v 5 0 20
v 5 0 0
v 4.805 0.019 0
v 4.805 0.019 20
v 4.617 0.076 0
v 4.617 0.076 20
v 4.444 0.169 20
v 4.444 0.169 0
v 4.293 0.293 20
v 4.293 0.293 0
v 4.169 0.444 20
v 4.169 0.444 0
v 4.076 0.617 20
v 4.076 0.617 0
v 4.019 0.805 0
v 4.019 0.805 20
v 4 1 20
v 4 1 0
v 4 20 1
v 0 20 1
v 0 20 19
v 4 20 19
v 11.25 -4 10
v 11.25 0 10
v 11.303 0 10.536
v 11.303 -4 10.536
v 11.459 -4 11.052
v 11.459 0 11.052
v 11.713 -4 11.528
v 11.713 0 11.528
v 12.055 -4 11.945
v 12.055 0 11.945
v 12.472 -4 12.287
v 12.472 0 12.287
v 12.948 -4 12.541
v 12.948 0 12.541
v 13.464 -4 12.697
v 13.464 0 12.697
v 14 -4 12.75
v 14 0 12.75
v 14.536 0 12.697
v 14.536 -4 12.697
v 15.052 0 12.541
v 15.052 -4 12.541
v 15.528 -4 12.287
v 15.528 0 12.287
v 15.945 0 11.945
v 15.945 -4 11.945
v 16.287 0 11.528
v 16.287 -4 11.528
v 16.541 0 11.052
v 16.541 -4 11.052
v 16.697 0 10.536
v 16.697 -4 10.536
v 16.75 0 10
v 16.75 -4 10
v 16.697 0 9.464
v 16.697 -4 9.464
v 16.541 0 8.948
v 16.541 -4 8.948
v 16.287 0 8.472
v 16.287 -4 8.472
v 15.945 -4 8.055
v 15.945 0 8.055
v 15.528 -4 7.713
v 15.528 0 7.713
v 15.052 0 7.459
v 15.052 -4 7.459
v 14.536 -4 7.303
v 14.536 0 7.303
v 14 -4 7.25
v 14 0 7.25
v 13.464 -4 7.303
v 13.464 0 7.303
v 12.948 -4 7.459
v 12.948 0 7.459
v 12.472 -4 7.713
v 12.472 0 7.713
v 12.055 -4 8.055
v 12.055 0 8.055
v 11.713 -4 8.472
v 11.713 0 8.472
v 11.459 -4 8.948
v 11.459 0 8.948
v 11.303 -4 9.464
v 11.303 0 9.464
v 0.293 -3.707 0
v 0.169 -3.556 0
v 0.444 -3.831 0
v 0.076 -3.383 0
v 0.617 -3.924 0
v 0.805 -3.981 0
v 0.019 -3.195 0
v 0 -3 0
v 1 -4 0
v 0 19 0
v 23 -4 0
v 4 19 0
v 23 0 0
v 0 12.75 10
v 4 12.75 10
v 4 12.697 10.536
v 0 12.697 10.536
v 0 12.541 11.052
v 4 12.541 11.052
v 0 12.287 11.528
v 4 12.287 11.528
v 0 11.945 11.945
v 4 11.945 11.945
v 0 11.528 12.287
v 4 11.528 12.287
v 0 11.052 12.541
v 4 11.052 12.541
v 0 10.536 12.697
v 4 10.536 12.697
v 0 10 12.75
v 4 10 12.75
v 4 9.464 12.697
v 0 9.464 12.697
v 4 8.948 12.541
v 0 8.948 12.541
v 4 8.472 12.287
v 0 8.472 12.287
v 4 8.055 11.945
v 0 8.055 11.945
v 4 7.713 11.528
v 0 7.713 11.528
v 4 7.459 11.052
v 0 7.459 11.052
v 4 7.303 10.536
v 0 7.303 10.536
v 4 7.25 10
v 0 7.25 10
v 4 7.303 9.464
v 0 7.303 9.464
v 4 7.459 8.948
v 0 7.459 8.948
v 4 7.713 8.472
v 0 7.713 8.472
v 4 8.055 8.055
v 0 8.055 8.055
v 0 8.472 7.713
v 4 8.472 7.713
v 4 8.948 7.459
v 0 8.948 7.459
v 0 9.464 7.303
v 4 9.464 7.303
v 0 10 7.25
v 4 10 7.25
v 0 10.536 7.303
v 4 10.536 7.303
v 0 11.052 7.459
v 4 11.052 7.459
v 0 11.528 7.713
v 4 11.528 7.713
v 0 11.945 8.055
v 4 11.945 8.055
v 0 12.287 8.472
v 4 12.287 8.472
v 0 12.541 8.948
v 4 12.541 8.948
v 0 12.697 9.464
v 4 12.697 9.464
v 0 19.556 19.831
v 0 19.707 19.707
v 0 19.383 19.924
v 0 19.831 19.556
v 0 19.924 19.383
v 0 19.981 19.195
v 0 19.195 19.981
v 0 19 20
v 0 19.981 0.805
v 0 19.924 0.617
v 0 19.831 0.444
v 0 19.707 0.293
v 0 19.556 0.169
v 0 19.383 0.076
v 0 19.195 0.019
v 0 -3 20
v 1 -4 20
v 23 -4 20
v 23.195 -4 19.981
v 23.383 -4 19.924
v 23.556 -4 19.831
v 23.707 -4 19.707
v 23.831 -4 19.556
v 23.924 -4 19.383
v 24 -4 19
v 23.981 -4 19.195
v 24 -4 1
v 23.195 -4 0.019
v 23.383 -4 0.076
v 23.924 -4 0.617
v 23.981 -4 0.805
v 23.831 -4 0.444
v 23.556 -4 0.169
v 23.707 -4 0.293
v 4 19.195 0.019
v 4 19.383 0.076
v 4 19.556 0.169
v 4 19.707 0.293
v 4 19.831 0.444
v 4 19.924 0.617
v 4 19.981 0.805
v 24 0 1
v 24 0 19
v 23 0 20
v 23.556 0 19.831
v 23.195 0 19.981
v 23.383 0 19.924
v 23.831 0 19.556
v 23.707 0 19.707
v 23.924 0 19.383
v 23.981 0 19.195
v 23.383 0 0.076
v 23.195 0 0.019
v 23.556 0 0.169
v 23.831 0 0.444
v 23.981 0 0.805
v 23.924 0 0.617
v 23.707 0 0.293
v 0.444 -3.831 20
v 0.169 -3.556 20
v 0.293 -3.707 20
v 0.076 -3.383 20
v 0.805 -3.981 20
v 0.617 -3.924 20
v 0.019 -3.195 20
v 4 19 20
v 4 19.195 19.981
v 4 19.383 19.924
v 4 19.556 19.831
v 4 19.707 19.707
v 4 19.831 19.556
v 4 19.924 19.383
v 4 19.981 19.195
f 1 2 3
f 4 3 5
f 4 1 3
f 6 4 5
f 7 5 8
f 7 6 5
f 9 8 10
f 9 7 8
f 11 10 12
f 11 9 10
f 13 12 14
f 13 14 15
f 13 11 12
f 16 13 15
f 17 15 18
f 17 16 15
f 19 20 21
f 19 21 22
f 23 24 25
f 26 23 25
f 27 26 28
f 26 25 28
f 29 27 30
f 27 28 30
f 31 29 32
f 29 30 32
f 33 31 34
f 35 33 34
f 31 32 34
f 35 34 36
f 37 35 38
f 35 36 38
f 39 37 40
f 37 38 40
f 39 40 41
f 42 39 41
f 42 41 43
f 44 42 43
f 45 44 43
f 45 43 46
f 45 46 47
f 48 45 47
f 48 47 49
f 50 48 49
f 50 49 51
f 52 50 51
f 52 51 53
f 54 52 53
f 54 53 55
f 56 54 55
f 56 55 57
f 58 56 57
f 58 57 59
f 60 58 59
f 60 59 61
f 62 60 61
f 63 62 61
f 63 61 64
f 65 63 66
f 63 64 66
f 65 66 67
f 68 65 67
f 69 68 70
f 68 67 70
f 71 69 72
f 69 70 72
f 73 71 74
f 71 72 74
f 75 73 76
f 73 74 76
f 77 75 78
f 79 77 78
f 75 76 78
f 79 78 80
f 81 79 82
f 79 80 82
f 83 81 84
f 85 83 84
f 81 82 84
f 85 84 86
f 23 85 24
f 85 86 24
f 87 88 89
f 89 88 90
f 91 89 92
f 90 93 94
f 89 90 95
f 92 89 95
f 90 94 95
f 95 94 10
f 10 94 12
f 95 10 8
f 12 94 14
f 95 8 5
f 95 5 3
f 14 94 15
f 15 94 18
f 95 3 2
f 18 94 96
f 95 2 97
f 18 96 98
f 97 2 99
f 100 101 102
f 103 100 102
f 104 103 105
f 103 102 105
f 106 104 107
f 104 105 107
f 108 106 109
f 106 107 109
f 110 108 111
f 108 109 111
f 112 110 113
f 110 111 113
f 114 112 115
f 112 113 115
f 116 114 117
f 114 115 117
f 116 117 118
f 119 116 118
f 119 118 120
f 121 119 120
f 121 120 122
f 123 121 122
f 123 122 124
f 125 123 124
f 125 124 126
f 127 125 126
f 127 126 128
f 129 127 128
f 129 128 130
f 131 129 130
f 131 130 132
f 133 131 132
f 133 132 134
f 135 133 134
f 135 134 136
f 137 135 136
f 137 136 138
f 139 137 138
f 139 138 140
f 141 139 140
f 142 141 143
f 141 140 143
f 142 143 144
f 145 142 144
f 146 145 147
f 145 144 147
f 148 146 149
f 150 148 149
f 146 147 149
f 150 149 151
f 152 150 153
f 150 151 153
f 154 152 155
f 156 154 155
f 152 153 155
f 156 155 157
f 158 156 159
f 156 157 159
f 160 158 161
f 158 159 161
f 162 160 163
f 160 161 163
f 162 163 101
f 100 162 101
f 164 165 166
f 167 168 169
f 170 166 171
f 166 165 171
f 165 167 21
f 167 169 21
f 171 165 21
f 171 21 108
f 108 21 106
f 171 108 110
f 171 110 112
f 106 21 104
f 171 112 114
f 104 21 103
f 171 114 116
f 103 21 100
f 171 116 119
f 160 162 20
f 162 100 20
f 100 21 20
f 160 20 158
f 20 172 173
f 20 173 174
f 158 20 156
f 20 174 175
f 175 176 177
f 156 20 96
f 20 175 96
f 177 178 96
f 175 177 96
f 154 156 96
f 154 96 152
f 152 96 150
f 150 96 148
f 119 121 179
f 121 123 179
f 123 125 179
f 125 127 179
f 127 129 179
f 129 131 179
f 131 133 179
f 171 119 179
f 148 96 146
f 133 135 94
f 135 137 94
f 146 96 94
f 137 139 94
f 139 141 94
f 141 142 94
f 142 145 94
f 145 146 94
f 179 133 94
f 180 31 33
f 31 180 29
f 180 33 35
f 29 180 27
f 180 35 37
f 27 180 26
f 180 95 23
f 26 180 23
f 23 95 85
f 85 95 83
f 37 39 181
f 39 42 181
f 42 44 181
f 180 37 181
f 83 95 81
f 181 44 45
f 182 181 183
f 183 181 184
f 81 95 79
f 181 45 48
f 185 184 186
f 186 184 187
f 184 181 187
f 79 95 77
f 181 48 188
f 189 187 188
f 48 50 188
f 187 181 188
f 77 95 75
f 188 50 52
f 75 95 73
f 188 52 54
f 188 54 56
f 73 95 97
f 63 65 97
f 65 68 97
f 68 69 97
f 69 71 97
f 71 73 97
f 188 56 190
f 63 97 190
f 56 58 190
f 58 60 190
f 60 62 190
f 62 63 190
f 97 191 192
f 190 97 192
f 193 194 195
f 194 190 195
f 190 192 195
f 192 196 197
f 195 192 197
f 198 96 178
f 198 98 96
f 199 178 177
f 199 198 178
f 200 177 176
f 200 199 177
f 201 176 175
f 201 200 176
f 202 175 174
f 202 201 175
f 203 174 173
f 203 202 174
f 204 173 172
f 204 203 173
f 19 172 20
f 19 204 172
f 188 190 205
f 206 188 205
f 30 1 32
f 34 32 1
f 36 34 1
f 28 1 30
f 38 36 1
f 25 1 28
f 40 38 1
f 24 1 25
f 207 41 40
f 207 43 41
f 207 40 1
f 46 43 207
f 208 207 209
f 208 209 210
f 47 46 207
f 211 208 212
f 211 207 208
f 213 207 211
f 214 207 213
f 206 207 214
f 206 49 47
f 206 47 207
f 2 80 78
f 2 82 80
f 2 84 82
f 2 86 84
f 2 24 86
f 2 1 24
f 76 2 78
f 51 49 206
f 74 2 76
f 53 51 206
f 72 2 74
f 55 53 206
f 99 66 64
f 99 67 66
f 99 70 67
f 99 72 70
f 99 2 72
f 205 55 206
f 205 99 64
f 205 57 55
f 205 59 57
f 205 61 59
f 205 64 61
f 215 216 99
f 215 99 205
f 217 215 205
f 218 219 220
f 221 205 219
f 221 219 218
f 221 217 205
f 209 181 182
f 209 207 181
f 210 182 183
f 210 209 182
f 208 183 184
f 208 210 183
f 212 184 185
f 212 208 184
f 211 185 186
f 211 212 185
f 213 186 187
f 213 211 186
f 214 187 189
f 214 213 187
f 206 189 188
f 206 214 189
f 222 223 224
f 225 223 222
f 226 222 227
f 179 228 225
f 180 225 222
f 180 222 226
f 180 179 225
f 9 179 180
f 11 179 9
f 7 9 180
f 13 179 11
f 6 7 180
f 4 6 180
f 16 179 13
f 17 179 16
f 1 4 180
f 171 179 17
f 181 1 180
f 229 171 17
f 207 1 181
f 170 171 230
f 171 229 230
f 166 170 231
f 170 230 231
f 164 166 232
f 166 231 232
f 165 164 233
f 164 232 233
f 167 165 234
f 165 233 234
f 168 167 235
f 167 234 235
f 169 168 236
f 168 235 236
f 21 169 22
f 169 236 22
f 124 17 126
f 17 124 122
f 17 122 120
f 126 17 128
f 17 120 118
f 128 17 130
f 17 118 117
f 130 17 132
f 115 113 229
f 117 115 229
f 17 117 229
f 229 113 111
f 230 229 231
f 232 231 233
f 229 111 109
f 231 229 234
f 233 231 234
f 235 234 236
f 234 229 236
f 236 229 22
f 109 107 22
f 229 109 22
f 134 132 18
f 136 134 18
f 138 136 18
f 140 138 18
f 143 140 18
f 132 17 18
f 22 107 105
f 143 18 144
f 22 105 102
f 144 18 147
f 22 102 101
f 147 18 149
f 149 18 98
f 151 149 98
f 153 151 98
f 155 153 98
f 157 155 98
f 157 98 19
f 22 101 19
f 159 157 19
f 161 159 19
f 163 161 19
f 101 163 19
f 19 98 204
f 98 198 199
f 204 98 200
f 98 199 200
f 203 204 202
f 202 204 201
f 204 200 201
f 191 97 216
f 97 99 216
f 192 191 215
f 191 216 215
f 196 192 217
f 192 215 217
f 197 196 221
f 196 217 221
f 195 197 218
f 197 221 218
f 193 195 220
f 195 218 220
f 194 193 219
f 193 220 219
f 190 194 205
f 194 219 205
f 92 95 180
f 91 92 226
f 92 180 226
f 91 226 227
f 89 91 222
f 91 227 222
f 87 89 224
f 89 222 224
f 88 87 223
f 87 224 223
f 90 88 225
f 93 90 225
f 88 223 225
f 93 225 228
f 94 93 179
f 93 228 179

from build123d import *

# Parameters (mm, degrees)
SKETCH_1_W          = 24
SKETCH_1_H          = 4
SKETCH_1_W_2        = 4
SKETCH_1_H_2        = 20
EXTRUDE_1_DEPTH     = 20
SKETCH_2_R          = 2.75
CUT_EXTRUDE_1_DEPTH = 20
SKETCH_3_R          = 2.75
CUT_EXTRUDE_2_DEPTH = 20
FILLET_1_R          = 1


with BuildPart() as part:
    # 스케치1 → 보스-돌출1 (new body)
    with BuildSketch(Plane.XY):
        with Locations((12, -2)):
            Rectangle(SKETCH_1_W, SKETCH_1_H)
        with Locations((2, 10)):
            Rectangle(SKETCH_1_W_2, SKETCH_1_H_2)
    extrude(amount=EXTRUDE_1_DEPTH)

    # 스케치2 → 컷-돌출1 (cut)
    with BuildSketch(Plane(origin=(0, 0, 0), x_dir=(1, 0, 0), z_dir=(0, 1, 0))):
        with Locations(Location((14, -10, 0), (0, 0, 180))):
            Circle(SKETCH_2_R)
    extrude(amount=-CUT_EXTRUDE_1_DEPTH, mode=Mode.SUBTRACT)

    # 스케치3 → 컷-돌출2 (cut)
    with BuildSketch(Plane(origin=(4, 0, 0), x_dir=(0, 0, -1), z_dir=(1, 0, 0))):
        with Locations(Location((-10, 10, 0), (0, 0, 90))):
            Circle(SKETCH_3_R)
    extrude(amount=-CUT_EXTRUDE_2_DEPTH, mode=Mode.SUBTRACT)

    # 필렛1
    fillet_1_edges = [part.edges().sort_by_distance(p)[0] for p in [
        (24, -2, 0),
        (0, -4, 10),
        (4, 0, 10),
        (2, 20, 20),
        (24, -2, 20),
        (2, 20, 0),
    ]]
    fillet(fillet_1_edges, radius=FILLET_1_R)


solid = part.part
